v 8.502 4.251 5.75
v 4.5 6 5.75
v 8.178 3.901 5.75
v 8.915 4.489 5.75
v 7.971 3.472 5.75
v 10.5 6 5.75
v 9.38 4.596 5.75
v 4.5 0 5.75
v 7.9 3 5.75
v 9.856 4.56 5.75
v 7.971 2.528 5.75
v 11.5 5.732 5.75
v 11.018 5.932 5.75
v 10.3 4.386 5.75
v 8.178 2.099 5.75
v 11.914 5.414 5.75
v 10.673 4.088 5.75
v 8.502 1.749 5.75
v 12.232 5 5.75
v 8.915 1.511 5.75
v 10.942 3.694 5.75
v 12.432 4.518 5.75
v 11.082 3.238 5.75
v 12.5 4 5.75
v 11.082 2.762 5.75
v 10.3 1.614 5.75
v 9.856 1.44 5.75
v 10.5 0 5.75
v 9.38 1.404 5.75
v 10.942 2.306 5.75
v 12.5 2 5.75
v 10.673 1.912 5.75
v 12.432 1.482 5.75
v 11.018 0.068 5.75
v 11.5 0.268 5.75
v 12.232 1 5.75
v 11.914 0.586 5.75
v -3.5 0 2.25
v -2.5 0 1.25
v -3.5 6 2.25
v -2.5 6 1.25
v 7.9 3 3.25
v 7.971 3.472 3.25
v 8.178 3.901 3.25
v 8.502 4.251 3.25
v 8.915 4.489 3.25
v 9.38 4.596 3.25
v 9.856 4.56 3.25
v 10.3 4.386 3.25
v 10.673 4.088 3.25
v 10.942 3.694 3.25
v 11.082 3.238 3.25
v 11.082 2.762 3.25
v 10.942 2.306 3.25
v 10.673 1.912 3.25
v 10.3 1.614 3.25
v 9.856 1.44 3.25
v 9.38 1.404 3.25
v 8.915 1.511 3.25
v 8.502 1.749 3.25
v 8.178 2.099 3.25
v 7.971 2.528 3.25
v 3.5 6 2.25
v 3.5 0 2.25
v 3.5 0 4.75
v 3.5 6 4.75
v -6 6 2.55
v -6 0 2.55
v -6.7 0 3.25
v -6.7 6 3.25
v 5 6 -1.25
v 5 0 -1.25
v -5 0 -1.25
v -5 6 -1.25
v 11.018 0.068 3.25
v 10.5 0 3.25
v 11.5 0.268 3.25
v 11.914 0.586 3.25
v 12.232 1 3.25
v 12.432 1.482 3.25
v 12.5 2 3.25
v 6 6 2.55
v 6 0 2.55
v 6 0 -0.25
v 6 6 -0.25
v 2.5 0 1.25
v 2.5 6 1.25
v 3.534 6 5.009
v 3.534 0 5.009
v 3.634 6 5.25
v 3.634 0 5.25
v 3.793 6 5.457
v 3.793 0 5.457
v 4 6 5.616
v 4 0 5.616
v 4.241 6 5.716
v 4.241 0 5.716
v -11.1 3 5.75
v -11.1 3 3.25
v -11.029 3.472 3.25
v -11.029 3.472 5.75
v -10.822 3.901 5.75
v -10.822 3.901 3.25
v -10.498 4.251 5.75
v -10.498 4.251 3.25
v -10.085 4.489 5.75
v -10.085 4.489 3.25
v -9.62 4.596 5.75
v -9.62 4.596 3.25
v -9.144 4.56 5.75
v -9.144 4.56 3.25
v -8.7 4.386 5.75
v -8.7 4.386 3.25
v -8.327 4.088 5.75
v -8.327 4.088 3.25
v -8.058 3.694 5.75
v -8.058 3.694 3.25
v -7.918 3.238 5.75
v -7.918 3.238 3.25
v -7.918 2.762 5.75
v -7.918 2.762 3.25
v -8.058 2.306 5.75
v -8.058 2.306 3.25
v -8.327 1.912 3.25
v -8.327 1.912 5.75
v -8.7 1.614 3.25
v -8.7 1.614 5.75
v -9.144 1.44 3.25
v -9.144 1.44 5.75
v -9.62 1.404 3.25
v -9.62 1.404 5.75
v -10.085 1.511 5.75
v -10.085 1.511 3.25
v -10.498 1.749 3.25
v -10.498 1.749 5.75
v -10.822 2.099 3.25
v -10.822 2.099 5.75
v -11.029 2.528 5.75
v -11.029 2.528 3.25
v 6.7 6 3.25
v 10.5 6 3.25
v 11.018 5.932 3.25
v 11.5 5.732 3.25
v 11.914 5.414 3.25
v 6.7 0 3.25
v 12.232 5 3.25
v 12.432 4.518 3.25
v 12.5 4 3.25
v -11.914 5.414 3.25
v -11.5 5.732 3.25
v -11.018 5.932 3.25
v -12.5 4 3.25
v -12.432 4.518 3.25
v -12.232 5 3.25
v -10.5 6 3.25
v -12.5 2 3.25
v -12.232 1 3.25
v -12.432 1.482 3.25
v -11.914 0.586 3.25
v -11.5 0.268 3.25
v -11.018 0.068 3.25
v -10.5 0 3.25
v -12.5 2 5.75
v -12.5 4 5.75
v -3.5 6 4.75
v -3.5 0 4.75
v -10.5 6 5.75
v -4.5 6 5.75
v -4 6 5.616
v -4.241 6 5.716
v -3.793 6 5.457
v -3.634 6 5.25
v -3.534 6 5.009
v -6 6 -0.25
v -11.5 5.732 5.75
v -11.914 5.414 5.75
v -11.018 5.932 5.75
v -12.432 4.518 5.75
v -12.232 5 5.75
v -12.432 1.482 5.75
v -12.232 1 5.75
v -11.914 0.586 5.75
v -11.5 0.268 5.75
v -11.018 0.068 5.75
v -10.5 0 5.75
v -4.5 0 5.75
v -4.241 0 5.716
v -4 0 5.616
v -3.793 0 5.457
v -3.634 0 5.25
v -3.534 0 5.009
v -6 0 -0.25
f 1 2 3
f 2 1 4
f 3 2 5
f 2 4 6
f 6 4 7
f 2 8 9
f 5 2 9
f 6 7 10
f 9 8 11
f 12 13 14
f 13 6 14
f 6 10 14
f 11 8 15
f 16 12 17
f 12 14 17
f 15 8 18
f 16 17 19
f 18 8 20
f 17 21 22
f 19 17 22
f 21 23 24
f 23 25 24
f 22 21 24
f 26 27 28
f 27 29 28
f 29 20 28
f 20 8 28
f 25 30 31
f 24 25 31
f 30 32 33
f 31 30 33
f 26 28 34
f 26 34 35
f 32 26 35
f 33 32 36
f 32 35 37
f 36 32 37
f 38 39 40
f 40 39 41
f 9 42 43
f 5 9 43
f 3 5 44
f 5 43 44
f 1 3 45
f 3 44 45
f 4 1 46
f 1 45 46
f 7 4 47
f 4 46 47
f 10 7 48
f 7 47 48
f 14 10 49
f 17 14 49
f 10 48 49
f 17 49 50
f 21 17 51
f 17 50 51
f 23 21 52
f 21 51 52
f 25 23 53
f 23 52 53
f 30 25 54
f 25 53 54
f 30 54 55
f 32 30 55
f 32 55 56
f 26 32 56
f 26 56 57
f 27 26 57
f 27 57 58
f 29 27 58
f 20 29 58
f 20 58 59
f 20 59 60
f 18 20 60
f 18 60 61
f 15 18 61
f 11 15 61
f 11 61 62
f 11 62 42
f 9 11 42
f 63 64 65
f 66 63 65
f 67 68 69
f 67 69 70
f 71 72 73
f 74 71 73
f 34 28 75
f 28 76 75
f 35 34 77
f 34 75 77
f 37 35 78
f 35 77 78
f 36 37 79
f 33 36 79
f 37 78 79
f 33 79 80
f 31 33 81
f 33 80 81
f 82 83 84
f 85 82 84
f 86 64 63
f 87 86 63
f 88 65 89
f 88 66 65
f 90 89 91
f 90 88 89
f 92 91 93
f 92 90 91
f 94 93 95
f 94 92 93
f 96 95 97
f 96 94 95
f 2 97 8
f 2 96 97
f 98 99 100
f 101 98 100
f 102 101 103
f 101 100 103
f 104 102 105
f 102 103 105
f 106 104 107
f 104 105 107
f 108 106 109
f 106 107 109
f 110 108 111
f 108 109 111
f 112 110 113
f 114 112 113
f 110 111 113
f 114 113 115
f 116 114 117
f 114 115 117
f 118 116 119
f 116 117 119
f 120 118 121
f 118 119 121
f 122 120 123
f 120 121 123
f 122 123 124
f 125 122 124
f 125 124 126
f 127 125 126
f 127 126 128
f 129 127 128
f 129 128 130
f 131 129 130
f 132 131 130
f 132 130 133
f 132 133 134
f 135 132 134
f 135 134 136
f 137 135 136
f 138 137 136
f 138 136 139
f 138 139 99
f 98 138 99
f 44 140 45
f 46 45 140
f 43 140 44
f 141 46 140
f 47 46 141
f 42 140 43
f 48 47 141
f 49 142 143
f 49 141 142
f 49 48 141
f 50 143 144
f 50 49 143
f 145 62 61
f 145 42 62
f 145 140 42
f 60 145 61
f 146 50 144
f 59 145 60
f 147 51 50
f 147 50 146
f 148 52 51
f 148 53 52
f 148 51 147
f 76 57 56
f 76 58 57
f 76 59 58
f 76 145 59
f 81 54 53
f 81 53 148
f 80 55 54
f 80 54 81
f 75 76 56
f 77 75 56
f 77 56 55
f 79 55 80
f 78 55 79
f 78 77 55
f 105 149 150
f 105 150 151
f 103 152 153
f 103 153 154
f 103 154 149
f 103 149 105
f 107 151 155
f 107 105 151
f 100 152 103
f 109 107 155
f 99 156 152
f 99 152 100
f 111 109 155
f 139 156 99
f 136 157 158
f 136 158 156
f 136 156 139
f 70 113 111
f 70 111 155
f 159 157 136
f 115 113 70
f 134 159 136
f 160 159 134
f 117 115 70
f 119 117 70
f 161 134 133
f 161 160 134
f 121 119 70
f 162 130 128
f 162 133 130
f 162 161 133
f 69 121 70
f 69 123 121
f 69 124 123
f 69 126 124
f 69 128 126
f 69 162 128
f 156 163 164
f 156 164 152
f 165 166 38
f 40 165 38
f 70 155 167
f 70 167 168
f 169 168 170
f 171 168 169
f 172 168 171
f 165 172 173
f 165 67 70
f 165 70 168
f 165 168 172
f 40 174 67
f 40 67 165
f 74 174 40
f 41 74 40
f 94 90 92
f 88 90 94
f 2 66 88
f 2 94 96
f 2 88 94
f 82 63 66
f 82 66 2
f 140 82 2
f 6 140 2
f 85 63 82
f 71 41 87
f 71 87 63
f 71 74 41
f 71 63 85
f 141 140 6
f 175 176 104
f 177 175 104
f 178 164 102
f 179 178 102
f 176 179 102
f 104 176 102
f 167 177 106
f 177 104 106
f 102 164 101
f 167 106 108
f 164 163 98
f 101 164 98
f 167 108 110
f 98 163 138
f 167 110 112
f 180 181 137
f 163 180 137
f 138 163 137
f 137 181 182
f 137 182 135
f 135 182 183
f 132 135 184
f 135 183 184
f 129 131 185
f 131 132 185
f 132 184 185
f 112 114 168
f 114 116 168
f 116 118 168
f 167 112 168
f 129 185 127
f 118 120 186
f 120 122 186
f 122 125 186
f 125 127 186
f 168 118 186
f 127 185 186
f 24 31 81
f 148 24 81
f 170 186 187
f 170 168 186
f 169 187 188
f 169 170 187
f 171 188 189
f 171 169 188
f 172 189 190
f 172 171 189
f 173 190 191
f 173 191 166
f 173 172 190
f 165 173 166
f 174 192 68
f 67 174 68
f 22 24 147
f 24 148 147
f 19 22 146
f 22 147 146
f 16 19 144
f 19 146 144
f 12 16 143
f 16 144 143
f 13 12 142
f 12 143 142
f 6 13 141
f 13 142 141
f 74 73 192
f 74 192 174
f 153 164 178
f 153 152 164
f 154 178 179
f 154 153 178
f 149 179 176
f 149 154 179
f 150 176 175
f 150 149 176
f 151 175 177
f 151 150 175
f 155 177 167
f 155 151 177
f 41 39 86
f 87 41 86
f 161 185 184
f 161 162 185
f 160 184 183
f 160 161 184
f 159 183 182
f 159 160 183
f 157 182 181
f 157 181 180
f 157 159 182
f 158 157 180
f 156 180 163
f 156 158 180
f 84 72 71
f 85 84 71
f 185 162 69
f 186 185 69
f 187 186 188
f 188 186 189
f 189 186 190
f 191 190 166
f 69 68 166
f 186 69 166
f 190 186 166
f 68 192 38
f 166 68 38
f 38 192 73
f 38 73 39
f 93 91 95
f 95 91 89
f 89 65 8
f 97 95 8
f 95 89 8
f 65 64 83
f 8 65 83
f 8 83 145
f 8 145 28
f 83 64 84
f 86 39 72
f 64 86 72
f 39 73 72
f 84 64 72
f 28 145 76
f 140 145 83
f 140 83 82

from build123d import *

# Parameters (mm, degrees)
SKETCH2_W           = 6.5
SKETCH2_H           = 2.5
SKETCH2_W_2         = 7
BOSS_EXTRUDE2_DEPTH = 6
SKETCH3_R           = 1.6
CUT_EXTRUDE1_DEPTH  = 3.5
CHAMFER1_SIZE       = 1
FILLET1_R           = 2
FILLET2_R           = 1
CHAMFER2_SIZE       = 0.7


with BuildPart() as part:
    # Sketch2 → Boss-Extrude2 (new body)
    with BuildSketch(Plane(origin=(0, 0, 0), x_dir=(1, 0, 0), z_dir=(0, 1, 0))):
        with Locations((-9.25, -4.5)):
            Rectangle(SKETCH2_W, SKETCH2_H)
        Polygon((-3.5, -5.75), (-3.5, -1.25), (-3.5, 1.25), (-6, 1.25), (-6, -3.25), (-6, -5.75), align=None)
        Rectangle(SKETCH2_W_2, SKETCH2_H)
        Polygon((3.5, 1.25), (3.5, -1.25), (3.5, -5.75), (6, -5.75), (6, -3.25), (6, 1.25), align=None)
        with Locations((9.25, -4.5)):
            Rectangle(SKETCH2_W, SKETCH2_H)
    extrude(amount=BOSS_EXTRUDE2_DEPTH)

    # Sketch3 → Cut-Extrude1 (cut, through all)
    with BuildSketch(Plane(origin=(0, 0, 3.25), x_dir=(-1, 0, 0), z_dir=(0, 0, -1))):
        with Locations((-9.5, 3)):
            Circle(SKETCH3_R)
        with Locations((9.5, 3)):
            Circle(SKETCH3_R)
    extrude(amount=-CUT_EXTRUDE1_DEPTH, mode=Mode.SUBTRACT)

    # Chamfer1
    chamfer1_edges = [part.edges().sort_by_distance(p)[0] for p in [
        (-6, 3, -1.25),
        (6, 3, -1.25),
        (3.5, 3, 1.25),
        (-3.5, 3, 1.25),
    ]]
    chamfer(chamfer1_edges, length=CHAMFER1_SIZE)

    # Fillet1
    fillet1_edges = [part.edges().sort_by_distance(p)[0] for p in [
        (12.5, 0, 4.5),
        (-12.5, 0, 4.5),
        (12.5, 6, 4.5),
        (-12.5, 6, 4.5),
    ]]
    fillet(fillet1_edges, radius=FILLET1_R)

    # Fillet2
    fillet2_edges = [part.edges().sort_by_distance(p)[0] for p in [
        (3.5, 3, 5.75),
        (-3.5, 3, 5.75),
    ]]
    fillet(fillet2_edges, radius=FILLET2_R)

    # Chamfer2
    chamfer2_edges = [part.edges().sort_by_distance(p)[0] for p in [
        (-6, 3, 3.25),
        (6, 3, 3.25),
    ]]
    chamfer(chamfer2_edges, length=CHAMFER2_SIZE)


solid = part.part
